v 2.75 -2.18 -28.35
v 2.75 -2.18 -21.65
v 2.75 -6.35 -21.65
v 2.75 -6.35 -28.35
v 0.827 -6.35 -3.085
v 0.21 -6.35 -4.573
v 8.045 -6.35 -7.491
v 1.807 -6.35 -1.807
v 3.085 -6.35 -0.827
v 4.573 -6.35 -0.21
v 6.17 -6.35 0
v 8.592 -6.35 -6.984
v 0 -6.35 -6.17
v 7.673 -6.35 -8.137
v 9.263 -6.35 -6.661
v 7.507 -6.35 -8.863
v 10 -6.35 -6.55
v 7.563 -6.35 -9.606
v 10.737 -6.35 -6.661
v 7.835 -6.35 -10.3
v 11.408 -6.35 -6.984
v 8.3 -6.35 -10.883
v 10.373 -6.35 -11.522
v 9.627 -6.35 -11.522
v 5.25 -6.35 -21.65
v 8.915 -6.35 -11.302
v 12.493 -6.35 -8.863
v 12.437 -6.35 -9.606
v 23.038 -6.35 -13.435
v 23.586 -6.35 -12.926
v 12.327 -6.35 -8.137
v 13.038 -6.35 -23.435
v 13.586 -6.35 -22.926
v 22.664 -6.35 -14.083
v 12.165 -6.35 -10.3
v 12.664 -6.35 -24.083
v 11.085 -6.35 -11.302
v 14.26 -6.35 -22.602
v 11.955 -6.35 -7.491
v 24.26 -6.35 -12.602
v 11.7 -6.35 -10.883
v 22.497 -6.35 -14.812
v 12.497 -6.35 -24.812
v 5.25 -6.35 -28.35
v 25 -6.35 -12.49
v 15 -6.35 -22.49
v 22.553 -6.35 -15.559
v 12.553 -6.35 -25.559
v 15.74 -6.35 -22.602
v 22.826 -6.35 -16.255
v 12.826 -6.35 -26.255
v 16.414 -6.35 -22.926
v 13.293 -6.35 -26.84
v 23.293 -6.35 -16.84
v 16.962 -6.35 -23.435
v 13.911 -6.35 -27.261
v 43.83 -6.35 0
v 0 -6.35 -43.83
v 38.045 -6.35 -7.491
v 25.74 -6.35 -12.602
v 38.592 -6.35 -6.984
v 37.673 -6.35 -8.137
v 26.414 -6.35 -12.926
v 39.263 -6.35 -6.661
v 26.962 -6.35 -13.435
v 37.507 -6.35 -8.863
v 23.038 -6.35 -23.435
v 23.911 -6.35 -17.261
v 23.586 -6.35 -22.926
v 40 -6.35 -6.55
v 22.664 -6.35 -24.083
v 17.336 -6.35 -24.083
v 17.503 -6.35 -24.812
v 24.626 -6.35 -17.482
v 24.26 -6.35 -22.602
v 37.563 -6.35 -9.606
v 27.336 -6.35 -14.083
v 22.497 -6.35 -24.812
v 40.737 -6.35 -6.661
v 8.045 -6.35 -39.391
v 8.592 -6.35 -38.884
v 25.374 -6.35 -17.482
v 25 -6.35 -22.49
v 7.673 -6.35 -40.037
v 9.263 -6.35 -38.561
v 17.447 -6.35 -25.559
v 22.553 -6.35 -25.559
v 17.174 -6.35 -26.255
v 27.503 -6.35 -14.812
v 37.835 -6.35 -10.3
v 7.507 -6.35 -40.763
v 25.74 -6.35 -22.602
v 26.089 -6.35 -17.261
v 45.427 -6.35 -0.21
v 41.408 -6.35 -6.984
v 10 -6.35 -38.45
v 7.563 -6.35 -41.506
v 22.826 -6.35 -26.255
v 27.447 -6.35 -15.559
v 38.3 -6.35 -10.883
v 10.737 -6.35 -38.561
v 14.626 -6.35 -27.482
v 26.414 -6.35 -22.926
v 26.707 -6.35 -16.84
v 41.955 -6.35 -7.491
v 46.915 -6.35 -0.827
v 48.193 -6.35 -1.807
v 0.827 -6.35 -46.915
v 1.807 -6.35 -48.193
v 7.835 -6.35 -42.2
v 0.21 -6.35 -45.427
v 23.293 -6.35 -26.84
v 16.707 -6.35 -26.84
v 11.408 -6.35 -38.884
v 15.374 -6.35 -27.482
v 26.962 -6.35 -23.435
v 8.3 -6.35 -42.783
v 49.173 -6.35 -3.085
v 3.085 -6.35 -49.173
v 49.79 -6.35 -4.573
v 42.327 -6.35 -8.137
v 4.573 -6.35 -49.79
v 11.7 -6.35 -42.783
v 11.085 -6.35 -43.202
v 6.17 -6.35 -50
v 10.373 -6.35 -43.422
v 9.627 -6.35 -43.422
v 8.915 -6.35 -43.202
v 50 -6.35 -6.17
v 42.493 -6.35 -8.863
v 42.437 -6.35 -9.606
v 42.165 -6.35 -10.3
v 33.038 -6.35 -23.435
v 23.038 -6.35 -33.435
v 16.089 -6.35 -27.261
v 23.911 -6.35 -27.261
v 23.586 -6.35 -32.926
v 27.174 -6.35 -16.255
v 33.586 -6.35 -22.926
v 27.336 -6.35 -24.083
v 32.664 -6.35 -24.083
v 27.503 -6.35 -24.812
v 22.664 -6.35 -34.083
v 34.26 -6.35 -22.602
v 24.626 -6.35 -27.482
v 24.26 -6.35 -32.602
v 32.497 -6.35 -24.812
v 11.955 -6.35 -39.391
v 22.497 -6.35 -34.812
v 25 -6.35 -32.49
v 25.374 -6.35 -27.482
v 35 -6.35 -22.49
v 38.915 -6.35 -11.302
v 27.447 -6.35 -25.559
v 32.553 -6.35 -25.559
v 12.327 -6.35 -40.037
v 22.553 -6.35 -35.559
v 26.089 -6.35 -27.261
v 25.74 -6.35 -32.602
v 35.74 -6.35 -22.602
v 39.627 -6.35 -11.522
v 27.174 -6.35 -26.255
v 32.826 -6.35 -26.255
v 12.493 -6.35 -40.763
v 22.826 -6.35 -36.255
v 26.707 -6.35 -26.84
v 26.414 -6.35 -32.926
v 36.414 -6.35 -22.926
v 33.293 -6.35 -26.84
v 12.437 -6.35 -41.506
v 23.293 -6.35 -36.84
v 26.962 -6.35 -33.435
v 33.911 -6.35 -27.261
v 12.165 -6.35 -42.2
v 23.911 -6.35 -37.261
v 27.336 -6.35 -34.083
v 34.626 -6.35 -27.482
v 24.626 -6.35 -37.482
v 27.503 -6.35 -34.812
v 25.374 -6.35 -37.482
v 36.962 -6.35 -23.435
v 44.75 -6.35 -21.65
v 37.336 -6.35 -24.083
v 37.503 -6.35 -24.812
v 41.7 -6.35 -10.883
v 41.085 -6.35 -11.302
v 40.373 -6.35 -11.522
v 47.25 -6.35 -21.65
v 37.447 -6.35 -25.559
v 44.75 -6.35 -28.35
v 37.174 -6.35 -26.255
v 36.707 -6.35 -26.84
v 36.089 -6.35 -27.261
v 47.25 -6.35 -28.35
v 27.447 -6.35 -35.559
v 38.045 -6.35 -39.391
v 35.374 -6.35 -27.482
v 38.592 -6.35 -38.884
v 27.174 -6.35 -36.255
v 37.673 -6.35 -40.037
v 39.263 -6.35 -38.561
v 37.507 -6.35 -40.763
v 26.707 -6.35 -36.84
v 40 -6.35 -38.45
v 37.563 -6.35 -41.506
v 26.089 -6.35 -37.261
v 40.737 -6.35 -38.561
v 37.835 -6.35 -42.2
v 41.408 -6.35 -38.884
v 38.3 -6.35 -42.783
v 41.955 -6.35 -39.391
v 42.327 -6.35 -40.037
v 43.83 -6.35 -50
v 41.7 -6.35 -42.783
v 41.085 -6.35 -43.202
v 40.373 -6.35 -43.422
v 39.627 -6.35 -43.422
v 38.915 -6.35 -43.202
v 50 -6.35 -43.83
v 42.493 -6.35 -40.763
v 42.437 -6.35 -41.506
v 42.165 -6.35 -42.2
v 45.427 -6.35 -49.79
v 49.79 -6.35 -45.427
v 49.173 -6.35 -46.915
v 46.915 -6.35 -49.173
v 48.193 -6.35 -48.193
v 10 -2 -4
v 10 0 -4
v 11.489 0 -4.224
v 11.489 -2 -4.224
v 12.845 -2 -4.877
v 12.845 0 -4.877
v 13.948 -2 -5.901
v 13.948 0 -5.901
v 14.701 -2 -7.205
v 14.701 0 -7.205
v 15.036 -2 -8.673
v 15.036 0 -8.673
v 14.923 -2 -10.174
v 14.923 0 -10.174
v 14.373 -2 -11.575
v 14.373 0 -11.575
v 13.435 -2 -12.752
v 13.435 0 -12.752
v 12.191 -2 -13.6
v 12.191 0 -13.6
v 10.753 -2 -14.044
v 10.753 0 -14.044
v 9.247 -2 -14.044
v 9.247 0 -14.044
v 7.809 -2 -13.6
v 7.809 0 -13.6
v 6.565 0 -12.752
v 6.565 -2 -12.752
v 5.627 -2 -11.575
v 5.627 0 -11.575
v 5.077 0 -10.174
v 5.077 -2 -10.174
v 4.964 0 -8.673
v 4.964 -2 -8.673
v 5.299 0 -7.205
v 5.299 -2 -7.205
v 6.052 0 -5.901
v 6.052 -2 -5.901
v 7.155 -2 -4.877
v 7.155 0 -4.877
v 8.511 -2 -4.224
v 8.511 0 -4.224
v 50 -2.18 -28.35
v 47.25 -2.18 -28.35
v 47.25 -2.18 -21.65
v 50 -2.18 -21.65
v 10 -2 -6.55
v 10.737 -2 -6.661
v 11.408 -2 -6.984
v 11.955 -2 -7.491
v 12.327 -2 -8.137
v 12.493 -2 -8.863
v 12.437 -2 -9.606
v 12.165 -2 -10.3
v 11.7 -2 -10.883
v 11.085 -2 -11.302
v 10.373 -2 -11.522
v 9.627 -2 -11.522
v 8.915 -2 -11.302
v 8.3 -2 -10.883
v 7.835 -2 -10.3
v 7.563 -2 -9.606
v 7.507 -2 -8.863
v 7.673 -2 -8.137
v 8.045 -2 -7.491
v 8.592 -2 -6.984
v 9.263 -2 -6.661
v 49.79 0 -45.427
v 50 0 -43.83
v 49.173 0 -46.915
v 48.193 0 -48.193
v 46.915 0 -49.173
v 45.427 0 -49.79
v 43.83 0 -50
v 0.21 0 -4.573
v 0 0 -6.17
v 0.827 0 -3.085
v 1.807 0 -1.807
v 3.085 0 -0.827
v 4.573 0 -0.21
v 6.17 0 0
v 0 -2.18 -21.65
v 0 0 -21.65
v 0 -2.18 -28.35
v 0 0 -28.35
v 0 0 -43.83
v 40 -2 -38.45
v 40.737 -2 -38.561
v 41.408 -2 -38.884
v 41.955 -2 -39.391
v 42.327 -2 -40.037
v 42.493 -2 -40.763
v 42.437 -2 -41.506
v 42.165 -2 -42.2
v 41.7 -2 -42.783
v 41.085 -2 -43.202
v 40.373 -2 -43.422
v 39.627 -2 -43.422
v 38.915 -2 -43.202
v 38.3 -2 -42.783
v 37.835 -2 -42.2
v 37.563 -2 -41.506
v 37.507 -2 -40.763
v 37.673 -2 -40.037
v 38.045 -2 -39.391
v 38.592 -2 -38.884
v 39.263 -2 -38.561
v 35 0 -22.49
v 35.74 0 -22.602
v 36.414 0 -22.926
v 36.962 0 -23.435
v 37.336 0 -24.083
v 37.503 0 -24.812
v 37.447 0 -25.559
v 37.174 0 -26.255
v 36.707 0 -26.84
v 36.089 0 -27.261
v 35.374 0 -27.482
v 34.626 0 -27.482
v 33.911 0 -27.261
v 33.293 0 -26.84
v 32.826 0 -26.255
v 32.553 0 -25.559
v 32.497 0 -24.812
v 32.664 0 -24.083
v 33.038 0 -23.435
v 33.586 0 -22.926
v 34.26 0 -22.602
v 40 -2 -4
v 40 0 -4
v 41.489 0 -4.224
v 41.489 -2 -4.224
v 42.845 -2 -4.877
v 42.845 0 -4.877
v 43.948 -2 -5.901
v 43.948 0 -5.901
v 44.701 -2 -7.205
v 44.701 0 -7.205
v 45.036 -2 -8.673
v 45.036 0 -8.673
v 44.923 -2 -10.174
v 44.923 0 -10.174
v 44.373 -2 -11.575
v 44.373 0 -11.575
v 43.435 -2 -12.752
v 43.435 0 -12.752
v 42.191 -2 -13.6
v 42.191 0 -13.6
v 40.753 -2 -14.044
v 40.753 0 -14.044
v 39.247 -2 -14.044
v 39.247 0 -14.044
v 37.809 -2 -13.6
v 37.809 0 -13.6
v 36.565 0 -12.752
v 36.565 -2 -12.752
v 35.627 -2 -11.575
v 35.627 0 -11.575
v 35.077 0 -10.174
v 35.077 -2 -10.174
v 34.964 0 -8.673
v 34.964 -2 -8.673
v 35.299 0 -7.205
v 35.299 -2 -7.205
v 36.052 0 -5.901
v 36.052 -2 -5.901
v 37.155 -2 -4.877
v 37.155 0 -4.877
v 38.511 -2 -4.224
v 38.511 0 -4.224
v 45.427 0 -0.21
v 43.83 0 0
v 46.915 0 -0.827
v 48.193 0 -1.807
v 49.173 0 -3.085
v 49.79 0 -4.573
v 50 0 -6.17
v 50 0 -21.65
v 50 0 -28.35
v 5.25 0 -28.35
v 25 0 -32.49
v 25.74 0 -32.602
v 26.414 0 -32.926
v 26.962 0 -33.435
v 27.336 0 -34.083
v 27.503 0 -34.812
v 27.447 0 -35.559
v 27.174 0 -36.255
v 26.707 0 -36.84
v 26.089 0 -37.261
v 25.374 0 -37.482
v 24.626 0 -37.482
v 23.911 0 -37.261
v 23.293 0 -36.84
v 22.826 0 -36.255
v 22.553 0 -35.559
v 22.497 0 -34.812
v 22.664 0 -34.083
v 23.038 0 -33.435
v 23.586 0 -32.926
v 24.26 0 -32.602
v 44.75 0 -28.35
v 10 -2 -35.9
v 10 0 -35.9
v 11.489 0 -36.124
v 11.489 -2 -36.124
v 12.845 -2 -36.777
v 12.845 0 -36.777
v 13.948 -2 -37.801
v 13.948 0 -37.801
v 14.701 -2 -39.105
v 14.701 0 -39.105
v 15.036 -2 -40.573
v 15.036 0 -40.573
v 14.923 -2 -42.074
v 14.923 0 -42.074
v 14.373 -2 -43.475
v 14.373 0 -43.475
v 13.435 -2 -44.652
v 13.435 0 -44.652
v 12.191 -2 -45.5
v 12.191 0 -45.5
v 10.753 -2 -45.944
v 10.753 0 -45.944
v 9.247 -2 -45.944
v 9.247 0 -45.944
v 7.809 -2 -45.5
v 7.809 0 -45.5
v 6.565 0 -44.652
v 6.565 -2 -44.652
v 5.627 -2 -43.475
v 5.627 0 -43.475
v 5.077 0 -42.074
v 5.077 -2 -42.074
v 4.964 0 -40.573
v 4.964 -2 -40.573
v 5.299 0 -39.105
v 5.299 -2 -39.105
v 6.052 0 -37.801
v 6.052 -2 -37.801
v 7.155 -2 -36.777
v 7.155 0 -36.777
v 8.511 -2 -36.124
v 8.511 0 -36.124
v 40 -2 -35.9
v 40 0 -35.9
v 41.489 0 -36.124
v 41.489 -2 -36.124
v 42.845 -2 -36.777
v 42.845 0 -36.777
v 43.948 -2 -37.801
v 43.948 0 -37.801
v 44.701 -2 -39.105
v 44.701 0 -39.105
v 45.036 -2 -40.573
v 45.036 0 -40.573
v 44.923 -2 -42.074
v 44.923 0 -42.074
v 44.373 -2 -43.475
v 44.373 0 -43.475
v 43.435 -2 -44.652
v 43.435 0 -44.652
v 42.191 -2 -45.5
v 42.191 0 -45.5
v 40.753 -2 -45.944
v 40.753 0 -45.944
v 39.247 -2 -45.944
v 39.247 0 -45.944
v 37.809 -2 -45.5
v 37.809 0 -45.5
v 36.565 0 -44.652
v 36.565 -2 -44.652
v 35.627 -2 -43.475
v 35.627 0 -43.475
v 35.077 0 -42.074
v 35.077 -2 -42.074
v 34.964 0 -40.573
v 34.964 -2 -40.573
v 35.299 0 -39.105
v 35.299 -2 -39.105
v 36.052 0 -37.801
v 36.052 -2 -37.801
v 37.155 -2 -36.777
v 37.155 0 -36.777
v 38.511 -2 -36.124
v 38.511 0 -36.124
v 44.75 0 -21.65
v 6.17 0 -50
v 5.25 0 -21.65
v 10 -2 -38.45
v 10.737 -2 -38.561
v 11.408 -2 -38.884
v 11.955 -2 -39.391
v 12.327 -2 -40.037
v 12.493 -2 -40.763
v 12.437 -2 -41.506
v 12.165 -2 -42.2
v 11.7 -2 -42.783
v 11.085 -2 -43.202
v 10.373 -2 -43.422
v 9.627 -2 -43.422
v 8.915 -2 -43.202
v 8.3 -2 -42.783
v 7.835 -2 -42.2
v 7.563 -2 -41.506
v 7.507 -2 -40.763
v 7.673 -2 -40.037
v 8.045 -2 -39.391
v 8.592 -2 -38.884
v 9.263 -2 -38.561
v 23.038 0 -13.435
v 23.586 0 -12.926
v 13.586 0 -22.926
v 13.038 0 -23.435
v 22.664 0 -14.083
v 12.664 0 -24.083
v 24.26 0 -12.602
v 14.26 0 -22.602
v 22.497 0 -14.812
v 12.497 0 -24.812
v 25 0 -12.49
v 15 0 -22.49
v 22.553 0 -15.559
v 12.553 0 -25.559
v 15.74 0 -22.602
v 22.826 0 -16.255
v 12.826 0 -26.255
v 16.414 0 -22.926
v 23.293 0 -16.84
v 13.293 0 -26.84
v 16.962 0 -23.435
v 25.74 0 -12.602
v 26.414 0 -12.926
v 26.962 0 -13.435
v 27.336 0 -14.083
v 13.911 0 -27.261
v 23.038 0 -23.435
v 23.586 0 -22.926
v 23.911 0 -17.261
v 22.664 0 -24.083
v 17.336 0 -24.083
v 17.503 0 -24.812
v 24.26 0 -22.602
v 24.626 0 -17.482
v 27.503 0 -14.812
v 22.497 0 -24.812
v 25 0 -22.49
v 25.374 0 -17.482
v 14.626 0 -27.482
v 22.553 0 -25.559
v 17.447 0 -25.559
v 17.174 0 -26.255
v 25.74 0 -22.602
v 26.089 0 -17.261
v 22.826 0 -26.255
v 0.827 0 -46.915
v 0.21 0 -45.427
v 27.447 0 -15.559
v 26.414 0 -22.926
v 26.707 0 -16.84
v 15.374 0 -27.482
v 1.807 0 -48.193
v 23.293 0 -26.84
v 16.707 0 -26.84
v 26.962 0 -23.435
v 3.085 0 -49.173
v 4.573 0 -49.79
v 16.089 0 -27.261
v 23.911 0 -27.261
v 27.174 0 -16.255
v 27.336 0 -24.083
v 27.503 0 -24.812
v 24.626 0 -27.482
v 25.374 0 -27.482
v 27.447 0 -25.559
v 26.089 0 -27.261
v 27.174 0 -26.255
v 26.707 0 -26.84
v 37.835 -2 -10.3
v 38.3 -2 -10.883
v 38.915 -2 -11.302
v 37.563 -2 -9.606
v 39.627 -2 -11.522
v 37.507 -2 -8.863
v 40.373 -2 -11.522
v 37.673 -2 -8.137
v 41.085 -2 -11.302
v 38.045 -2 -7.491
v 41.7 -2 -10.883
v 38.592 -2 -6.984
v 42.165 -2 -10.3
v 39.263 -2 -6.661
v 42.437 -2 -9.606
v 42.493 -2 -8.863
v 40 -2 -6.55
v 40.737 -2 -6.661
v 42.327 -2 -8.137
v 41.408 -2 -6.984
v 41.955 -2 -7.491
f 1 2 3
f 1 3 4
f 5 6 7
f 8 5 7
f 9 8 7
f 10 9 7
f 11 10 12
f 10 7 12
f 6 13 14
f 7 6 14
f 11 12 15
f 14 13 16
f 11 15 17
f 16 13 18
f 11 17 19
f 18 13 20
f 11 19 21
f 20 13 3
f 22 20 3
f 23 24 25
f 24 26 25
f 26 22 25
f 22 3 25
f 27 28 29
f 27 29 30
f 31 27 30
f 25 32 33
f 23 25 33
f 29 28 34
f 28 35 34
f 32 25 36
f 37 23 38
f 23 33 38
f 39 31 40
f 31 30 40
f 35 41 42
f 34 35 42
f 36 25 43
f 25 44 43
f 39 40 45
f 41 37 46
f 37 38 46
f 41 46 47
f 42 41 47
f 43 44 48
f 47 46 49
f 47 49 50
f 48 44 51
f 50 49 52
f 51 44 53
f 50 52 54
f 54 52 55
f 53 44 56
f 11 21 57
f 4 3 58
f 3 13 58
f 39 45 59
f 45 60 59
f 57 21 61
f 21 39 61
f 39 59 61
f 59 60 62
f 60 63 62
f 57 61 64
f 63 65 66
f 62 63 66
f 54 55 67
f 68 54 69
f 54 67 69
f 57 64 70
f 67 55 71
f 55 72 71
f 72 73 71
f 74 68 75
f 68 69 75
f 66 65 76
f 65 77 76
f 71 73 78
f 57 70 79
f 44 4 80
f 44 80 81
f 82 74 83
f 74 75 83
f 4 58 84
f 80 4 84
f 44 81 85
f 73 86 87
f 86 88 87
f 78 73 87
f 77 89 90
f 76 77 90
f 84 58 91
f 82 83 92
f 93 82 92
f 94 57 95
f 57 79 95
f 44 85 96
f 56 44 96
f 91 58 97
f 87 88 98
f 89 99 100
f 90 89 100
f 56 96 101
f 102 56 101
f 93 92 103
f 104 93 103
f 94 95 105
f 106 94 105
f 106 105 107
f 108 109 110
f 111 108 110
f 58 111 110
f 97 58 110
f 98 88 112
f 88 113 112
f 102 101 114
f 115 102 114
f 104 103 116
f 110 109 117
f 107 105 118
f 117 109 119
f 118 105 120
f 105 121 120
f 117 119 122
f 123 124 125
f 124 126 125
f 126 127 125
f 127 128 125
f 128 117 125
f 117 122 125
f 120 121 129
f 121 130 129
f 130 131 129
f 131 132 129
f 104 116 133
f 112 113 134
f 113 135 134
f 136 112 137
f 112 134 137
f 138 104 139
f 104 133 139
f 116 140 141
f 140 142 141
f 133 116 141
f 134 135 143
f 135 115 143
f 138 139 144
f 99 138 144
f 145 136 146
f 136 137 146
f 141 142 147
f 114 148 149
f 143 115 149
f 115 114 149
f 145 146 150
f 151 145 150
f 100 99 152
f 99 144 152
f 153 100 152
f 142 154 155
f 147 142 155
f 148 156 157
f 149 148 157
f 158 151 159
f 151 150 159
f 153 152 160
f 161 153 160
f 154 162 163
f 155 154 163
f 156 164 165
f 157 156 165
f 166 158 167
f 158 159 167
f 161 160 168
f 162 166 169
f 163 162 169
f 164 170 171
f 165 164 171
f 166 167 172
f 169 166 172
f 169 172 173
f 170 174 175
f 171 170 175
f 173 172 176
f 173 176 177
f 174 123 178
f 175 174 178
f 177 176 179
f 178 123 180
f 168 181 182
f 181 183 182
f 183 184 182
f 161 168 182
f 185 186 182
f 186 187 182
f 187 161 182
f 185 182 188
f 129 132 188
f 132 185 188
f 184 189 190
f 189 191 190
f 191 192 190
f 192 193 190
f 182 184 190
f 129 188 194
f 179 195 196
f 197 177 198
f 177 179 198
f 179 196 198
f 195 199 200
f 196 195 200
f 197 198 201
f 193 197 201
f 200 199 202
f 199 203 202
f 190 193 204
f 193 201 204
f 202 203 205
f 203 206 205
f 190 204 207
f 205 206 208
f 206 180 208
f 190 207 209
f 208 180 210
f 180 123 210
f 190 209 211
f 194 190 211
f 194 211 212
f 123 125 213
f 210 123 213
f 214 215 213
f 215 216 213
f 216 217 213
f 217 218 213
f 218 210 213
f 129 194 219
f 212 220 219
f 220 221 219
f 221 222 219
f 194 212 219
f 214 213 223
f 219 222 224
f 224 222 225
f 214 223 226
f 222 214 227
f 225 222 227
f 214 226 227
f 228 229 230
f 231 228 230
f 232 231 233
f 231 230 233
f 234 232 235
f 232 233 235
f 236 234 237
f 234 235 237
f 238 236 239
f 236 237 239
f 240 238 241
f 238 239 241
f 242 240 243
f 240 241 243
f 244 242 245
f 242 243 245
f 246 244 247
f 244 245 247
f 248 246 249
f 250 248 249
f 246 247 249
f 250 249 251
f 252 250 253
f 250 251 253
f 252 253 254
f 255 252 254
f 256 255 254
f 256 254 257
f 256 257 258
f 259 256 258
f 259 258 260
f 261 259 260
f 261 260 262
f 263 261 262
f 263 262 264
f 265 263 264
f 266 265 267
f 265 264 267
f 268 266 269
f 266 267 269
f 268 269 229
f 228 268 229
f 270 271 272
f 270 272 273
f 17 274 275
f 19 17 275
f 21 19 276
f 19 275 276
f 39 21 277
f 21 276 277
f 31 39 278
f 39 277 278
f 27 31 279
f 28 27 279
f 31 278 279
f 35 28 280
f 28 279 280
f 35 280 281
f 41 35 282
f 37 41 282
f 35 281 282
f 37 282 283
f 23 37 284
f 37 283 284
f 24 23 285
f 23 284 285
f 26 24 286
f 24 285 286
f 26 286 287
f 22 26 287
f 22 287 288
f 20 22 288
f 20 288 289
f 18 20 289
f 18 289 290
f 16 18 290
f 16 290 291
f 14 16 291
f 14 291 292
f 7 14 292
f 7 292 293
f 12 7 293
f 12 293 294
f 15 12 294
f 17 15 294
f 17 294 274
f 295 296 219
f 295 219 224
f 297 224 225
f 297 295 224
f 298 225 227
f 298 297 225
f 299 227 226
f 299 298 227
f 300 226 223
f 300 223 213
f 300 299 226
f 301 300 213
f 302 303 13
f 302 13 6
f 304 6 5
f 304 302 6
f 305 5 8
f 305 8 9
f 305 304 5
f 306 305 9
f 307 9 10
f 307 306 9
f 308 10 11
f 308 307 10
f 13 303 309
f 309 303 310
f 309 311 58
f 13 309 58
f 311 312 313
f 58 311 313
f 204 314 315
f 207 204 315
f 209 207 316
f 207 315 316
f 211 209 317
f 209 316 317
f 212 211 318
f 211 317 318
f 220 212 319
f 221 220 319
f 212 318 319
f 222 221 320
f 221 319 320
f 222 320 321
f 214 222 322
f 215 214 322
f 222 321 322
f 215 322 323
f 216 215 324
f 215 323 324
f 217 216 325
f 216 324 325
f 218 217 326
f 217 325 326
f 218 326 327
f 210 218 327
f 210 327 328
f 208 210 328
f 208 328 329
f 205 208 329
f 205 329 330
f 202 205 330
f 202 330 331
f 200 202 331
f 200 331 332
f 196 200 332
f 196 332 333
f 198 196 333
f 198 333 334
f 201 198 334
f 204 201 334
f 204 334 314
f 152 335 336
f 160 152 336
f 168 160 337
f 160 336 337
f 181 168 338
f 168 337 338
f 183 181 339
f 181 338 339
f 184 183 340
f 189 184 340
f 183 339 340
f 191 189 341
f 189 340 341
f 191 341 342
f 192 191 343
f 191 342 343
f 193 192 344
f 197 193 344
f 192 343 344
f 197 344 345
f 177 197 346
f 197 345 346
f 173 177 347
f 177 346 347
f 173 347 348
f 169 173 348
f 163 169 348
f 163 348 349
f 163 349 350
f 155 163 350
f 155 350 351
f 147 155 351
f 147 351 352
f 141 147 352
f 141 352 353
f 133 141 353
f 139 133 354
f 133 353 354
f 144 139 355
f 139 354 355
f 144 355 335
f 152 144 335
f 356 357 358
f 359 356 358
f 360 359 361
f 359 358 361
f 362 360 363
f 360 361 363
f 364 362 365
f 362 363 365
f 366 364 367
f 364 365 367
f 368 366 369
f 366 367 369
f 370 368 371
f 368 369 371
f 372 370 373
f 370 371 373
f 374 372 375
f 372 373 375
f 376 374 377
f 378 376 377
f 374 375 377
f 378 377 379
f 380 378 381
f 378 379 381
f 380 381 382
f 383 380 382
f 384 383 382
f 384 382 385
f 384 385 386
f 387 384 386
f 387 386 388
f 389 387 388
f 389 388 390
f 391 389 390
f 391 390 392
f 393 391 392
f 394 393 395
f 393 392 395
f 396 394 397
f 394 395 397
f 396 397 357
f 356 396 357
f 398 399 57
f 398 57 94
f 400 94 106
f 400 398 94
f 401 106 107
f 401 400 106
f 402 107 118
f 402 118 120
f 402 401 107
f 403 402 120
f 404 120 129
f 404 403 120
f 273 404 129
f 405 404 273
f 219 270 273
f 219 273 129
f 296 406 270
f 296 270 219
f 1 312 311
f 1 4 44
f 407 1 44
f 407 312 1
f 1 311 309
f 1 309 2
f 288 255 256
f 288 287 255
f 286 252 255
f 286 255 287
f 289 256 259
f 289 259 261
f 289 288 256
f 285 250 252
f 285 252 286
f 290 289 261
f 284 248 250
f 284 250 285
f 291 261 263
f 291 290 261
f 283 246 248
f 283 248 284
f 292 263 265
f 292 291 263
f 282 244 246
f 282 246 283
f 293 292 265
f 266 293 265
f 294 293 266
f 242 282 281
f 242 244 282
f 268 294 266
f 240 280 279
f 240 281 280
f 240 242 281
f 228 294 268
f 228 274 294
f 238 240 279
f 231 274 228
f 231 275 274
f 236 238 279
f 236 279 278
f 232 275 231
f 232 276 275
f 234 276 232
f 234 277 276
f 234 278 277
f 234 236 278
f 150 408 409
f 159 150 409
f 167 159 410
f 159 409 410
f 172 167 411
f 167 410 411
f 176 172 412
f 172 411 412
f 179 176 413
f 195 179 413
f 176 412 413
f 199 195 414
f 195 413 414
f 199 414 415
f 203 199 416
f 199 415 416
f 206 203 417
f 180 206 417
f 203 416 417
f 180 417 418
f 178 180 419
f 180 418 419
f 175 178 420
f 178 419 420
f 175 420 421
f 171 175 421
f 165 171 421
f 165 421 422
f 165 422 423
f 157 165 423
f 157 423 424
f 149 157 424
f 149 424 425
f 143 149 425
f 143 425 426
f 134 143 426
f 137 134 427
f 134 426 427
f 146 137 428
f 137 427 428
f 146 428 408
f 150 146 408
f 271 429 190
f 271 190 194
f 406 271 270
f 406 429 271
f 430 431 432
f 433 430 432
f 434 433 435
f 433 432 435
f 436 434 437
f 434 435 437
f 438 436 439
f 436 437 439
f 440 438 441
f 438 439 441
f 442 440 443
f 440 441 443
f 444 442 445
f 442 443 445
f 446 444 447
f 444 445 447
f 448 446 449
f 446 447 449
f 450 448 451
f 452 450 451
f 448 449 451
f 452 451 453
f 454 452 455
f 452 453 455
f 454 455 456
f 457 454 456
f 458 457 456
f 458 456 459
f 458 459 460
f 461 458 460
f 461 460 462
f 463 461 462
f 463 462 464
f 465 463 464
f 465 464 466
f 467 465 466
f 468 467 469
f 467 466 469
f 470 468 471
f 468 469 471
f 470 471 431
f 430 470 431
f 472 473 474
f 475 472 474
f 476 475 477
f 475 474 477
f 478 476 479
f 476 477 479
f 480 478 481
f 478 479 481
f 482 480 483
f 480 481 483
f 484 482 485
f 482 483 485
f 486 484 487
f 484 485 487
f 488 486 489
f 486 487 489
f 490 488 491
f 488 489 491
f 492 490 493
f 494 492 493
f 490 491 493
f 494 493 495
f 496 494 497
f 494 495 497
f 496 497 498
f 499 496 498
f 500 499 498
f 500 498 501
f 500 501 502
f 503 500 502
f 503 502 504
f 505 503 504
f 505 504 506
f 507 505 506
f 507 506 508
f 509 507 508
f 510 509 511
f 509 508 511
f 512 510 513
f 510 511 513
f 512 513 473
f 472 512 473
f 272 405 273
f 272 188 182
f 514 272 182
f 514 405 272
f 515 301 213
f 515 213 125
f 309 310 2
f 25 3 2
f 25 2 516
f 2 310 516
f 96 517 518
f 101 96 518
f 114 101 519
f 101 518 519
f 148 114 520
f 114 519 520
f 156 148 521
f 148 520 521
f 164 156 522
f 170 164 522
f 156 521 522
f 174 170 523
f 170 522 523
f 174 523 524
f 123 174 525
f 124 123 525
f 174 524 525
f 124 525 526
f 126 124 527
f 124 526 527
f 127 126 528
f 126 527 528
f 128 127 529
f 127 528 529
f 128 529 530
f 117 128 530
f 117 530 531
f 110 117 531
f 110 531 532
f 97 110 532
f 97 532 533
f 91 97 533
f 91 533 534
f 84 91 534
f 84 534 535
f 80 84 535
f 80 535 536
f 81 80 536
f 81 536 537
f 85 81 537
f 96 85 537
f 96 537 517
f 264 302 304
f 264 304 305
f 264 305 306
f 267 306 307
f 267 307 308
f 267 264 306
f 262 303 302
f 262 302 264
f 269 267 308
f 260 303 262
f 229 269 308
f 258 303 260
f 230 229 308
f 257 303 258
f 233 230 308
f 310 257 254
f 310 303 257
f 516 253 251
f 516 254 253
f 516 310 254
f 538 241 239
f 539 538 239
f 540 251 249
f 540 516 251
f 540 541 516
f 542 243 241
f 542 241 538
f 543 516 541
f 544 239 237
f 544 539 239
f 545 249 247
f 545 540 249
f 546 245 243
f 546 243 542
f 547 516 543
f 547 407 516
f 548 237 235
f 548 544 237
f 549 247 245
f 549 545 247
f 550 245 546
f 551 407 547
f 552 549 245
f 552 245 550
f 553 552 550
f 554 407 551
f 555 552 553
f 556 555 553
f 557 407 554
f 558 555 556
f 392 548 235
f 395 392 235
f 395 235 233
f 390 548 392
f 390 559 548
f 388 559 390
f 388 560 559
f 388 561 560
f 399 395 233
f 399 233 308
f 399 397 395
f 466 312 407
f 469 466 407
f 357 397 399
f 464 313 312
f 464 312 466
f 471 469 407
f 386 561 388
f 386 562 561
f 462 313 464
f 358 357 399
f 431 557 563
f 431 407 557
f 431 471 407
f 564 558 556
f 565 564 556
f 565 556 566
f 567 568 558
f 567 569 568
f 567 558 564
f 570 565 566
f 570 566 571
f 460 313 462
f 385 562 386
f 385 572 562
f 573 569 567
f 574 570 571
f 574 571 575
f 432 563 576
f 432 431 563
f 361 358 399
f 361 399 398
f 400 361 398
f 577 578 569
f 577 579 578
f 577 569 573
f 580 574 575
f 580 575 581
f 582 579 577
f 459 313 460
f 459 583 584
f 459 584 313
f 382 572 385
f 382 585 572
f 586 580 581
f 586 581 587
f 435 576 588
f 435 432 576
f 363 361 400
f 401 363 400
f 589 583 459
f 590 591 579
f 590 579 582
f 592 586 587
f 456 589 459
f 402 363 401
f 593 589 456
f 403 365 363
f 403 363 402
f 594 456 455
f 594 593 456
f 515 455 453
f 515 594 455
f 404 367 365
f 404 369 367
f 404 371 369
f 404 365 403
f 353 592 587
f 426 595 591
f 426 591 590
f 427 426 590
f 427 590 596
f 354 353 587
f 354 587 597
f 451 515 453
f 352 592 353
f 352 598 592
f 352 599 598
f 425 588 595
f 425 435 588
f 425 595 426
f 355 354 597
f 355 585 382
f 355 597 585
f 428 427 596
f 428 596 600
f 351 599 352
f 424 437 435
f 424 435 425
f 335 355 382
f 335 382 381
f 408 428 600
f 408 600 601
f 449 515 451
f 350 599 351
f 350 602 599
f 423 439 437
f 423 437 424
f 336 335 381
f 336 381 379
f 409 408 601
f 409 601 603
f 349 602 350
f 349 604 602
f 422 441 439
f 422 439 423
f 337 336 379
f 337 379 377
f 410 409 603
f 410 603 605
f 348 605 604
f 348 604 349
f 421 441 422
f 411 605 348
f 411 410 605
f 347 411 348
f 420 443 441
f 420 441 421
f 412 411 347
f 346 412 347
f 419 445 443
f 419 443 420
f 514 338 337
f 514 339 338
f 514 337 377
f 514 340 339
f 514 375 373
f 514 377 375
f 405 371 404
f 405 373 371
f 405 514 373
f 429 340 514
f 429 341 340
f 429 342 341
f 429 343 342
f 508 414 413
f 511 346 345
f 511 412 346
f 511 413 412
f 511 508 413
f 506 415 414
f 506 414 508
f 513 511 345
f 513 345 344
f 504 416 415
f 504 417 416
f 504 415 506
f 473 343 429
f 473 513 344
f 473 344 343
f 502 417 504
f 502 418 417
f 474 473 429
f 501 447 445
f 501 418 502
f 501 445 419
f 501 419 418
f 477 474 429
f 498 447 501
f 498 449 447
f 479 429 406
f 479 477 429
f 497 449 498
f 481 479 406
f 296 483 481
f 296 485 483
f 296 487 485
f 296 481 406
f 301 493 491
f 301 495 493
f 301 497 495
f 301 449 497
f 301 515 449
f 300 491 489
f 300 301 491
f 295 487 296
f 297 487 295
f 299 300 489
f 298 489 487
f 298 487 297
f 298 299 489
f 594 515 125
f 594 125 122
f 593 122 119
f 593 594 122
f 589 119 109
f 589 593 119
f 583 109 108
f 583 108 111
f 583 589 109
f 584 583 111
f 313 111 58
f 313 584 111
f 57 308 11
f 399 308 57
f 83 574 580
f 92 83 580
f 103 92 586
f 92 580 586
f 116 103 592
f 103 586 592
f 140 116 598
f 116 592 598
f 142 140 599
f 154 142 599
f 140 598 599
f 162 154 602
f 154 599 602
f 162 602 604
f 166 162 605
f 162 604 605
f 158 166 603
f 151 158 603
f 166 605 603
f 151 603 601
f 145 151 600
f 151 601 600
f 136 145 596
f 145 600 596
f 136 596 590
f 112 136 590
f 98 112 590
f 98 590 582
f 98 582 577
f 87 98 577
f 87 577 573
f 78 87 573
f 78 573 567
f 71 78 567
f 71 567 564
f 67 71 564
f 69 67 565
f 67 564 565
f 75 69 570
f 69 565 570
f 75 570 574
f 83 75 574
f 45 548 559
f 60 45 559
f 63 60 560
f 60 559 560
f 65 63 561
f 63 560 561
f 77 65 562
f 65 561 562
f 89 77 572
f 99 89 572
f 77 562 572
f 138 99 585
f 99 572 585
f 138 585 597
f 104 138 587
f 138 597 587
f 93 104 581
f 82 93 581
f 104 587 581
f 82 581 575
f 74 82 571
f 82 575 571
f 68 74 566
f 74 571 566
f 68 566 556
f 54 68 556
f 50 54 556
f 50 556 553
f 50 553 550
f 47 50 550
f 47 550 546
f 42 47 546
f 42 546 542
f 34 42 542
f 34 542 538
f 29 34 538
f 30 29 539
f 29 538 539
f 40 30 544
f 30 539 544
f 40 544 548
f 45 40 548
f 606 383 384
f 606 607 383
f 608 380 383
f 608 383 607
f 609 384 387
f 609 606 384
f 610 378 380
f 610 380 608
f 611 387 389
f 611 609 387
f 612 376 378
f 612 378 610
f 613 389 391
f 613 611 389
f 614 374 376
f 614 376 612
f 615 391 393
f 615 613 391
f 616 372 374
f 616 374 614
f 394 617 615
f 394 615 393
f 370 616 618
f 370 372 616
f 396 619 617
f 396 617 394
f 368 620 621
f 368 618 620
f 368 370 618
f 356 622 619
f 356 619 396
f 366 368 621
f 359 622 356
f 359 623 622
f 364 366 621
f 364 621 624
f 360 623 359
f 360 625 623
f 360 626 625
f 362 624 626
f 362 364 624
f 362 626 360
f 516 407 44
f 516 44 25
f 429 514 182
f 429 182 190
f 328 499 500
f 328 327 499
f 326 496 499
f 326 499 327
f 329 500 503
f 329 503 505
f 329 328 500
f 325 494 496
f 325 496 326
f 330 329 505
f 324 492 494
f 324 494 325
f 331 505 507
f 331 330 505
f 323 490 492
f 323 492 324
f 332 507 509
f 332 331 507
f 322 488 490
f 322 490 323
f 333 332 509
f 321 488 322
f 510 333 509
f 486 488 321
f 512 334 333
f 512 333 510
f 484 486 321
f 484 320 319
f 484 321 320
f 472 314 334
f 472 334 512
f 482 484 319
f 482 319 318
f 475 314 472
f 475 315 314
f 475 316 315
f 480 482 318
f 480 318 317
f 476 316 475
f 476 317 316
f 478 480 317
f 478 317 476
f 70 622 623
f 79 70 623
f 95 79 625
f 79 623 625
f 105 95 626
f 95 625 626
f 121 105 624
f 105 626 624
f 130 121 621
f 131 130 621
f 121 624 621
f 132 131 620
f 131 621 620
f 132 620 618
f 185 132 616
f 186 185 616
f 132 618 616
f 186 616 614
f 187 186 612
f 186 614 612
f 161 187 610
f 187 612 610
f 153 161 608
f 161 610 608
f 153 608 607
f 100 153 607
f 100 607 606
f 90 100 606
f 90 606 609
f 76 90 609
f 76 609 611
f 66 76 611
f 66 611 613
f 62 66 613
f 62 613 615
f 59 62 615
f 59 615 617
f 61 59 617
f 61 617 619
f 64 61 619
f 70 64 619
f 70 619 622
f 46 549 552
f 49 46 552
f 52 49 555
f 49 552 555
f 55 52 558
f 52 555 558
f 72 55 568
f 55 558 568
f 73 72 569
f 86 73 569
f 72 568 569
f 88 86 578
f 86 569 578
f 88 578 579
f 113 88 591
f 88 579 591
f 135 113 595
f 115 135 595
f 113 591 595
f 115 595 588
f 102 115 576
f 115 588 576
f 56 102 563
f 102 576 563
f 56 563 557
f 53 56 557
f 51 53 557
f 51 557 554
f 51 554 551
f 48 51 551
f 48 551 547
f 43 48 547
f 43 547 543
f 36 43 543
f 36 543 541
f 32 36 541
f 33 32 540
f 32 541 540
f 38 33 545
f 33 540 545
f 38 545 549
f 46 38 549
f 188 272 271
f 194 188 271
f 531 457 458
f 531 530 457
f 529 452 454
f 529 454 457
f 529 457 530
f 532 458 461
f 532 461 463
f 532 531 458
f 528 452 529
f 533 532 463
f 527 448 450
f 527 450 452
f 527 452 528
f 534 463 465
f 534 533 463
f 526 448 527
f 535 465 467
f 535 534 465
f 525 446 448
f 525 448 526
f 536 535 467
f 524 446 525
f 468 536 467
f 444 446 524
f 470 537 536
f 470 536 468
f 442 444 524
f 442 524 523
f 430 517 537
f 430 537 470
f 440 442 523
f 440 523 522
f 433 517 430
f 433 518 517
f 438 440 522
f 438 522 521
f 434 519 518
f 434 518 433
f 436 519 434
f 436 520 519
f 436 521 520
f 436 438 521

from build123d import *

# Parameters (mm, degrees)
SKETCH1_W           = 2.5
SKETCH1_H           = 6.7
SKETCH1_R           = 2.51
SKETCH1_R_2         = 2.5
BOSS_EXTRUDE1_DEPTH = 6.35
SKETCH1_4_W         = 2.75
SKETCH1_4_H         = 6.7
CUT_EXTRUDE1_DEPTH  = 2.18
SKETCH1_5_R         = 5.05
SKETCH1_5_R_2       = 2.5
CUT_EXTRUDE2_DEPTH  = 2


with BuildPart() as part:
    # Sketch1 → Boss-Extrude1 (new body)
    with BuildSketch(Plane(origin=(0, 0, 0), x_dir=(1, 0, 0), z_dir=(0, 1, 0))):
        with BuildLine():
            ThreePointArc((0, 6.17), (1.80715116, 1.80715116), (6.17, 0))
            Line((6.17, 0), (43.83, 0))
            ThreePointArc((43.83, 0), (48.19284884, 1.80715116), (50, 6.17))
            Line((50, 6.17), (50, 43.83))
            ThreePointArc((50, 43.83), (48.19284884, 48.19284884), (43.83, 50))
            Line((43.83, 50), (6.17, 50))
            ThreePointArc((6.17, 50), (1.80715116, 48.19284884), (0, 43.83))
            Line((0, 43.83), (0, 6.17))
        make_face()
        with Locations((4, 25)):
            Rectangle(SKETCH1_W, SKETCH1_H, mode=Mode.SUBTRACT)
        with Locations((46, 25)):
            Rectangle(SKETCH1_W, SKETCH1_H, mode=Mode.SUBTRACT)
        with Locations((25, 15)):
            Circle(SKETCH1_R, mode=Mode.SUBTRACT)
        with Locations((15, 25)):
            Circle(SKETCH1_R, mode=Mode.SUBTRACT)
        with Locations((25, 25)):
            Circle(SKETCH1_R, mode=Mode.SUBTRACT)
        with Locations((35, 25)):
            Circle(SKETCH1_R, mode=Mode.SUBTRACT)
        with Locations((25, 35)):
            Circle(SKETCH1_R, mode=Mode.SUBTRACT)
        with Locations((10, 9.05)):
            Circle(SKETCH1_R_2, mode=Mode.SUBTRACT)
        with Locations((40, 9.05)):
            Circle(SKETCH1_R_2, mode=Mode.SUBTRACT)
        with Locations((10, 40.95)):
            Circle(SKETCH1_R_2, mode=Mode.SUBTRACT)
        with Locations((40, 40.95)):
            Circle(SKETCH1_R_2, mode=Mode.SUBTRACT)
    extrude(amount=-BOSS_EXTRUDE1_DEPTH)

    # Sketch1<4> → Cut-Extrude1 (cut)
    with BuildSketch(Plane(origin=(0, 0, 0), x_dir=(1, 0, 0), z_dir=(0, 1, 0))):
        with Locations((1.375, 25)):
            Rectangle(SKETCH1_4_W, SKETCH1_4_H)
        with Locations((48.625, 25)):
            Rectangle(SKETCH1_4_W, SKETCH1_4_H)
    extrude(amount=-CUT_EXTRUDE1_DEPTH, mode=Mode.SUBTRACT)

    # Sketch1<5> → Cut-Extrude2 (cut)
    # profile 1 of 4: a face of its own
    with BuildSketch(Plane(origin=(0, 0, 0), x_dir=(1, 0, 0), z_dir=(0, 1, 0))):
        with Locations((10, 9.05)):
            Circle(SKETCH1_5_R)
        with Locations((10, 9.05)):
            Circle(SKETCH1_5_R_2, mode=Mode.SUBTRACT)
    # profile 2 of 4: a face of its own
    with BuildSketch(Plane(origin=(0, 0, 0), x_dir=(1, 0, 0), z_dir=(0, 1, 0))):
        with Locations((40, 9.05)):
            Circle(SKETCH1_5_R)
        with Locations((40, 9.05)):
            Circle(SKETCH1_5_R_2, mode=Mode.SUBTRACT)
    # profile 3 of 4: a face of its own
    with BuildSketch(Plane(origin=(0, 0, 0), x_dir=(1, 0, 0), z_dir=(0, 1, 0))):
        with Locations((40, 40.95)):
            Circle(SKETCH1_5_R)
        with Locations((40, 40.95)):
            Circle(SKETCH1_5_R_2, mode=Mode.SUBTRACT)
    # profile 4 of 4: a face of its own
    with BuildSketch(Plane(origin=(0, 0, 0), x_dir=(1, 0, 0), z_dir=(0, 1, 0))):
        with Locations((10, 40.95)):
            Circle(SKETCH1_5_R)
        with Locations((10, 40.95)):
            Circle(SKETCH1_5_R_2, mode=Mode.SUBTRACT)
    extrude(amount=-CUT_EXTRUDE2_DEPTH, mode=Mode.SUBTRACT)


solid = part.part
